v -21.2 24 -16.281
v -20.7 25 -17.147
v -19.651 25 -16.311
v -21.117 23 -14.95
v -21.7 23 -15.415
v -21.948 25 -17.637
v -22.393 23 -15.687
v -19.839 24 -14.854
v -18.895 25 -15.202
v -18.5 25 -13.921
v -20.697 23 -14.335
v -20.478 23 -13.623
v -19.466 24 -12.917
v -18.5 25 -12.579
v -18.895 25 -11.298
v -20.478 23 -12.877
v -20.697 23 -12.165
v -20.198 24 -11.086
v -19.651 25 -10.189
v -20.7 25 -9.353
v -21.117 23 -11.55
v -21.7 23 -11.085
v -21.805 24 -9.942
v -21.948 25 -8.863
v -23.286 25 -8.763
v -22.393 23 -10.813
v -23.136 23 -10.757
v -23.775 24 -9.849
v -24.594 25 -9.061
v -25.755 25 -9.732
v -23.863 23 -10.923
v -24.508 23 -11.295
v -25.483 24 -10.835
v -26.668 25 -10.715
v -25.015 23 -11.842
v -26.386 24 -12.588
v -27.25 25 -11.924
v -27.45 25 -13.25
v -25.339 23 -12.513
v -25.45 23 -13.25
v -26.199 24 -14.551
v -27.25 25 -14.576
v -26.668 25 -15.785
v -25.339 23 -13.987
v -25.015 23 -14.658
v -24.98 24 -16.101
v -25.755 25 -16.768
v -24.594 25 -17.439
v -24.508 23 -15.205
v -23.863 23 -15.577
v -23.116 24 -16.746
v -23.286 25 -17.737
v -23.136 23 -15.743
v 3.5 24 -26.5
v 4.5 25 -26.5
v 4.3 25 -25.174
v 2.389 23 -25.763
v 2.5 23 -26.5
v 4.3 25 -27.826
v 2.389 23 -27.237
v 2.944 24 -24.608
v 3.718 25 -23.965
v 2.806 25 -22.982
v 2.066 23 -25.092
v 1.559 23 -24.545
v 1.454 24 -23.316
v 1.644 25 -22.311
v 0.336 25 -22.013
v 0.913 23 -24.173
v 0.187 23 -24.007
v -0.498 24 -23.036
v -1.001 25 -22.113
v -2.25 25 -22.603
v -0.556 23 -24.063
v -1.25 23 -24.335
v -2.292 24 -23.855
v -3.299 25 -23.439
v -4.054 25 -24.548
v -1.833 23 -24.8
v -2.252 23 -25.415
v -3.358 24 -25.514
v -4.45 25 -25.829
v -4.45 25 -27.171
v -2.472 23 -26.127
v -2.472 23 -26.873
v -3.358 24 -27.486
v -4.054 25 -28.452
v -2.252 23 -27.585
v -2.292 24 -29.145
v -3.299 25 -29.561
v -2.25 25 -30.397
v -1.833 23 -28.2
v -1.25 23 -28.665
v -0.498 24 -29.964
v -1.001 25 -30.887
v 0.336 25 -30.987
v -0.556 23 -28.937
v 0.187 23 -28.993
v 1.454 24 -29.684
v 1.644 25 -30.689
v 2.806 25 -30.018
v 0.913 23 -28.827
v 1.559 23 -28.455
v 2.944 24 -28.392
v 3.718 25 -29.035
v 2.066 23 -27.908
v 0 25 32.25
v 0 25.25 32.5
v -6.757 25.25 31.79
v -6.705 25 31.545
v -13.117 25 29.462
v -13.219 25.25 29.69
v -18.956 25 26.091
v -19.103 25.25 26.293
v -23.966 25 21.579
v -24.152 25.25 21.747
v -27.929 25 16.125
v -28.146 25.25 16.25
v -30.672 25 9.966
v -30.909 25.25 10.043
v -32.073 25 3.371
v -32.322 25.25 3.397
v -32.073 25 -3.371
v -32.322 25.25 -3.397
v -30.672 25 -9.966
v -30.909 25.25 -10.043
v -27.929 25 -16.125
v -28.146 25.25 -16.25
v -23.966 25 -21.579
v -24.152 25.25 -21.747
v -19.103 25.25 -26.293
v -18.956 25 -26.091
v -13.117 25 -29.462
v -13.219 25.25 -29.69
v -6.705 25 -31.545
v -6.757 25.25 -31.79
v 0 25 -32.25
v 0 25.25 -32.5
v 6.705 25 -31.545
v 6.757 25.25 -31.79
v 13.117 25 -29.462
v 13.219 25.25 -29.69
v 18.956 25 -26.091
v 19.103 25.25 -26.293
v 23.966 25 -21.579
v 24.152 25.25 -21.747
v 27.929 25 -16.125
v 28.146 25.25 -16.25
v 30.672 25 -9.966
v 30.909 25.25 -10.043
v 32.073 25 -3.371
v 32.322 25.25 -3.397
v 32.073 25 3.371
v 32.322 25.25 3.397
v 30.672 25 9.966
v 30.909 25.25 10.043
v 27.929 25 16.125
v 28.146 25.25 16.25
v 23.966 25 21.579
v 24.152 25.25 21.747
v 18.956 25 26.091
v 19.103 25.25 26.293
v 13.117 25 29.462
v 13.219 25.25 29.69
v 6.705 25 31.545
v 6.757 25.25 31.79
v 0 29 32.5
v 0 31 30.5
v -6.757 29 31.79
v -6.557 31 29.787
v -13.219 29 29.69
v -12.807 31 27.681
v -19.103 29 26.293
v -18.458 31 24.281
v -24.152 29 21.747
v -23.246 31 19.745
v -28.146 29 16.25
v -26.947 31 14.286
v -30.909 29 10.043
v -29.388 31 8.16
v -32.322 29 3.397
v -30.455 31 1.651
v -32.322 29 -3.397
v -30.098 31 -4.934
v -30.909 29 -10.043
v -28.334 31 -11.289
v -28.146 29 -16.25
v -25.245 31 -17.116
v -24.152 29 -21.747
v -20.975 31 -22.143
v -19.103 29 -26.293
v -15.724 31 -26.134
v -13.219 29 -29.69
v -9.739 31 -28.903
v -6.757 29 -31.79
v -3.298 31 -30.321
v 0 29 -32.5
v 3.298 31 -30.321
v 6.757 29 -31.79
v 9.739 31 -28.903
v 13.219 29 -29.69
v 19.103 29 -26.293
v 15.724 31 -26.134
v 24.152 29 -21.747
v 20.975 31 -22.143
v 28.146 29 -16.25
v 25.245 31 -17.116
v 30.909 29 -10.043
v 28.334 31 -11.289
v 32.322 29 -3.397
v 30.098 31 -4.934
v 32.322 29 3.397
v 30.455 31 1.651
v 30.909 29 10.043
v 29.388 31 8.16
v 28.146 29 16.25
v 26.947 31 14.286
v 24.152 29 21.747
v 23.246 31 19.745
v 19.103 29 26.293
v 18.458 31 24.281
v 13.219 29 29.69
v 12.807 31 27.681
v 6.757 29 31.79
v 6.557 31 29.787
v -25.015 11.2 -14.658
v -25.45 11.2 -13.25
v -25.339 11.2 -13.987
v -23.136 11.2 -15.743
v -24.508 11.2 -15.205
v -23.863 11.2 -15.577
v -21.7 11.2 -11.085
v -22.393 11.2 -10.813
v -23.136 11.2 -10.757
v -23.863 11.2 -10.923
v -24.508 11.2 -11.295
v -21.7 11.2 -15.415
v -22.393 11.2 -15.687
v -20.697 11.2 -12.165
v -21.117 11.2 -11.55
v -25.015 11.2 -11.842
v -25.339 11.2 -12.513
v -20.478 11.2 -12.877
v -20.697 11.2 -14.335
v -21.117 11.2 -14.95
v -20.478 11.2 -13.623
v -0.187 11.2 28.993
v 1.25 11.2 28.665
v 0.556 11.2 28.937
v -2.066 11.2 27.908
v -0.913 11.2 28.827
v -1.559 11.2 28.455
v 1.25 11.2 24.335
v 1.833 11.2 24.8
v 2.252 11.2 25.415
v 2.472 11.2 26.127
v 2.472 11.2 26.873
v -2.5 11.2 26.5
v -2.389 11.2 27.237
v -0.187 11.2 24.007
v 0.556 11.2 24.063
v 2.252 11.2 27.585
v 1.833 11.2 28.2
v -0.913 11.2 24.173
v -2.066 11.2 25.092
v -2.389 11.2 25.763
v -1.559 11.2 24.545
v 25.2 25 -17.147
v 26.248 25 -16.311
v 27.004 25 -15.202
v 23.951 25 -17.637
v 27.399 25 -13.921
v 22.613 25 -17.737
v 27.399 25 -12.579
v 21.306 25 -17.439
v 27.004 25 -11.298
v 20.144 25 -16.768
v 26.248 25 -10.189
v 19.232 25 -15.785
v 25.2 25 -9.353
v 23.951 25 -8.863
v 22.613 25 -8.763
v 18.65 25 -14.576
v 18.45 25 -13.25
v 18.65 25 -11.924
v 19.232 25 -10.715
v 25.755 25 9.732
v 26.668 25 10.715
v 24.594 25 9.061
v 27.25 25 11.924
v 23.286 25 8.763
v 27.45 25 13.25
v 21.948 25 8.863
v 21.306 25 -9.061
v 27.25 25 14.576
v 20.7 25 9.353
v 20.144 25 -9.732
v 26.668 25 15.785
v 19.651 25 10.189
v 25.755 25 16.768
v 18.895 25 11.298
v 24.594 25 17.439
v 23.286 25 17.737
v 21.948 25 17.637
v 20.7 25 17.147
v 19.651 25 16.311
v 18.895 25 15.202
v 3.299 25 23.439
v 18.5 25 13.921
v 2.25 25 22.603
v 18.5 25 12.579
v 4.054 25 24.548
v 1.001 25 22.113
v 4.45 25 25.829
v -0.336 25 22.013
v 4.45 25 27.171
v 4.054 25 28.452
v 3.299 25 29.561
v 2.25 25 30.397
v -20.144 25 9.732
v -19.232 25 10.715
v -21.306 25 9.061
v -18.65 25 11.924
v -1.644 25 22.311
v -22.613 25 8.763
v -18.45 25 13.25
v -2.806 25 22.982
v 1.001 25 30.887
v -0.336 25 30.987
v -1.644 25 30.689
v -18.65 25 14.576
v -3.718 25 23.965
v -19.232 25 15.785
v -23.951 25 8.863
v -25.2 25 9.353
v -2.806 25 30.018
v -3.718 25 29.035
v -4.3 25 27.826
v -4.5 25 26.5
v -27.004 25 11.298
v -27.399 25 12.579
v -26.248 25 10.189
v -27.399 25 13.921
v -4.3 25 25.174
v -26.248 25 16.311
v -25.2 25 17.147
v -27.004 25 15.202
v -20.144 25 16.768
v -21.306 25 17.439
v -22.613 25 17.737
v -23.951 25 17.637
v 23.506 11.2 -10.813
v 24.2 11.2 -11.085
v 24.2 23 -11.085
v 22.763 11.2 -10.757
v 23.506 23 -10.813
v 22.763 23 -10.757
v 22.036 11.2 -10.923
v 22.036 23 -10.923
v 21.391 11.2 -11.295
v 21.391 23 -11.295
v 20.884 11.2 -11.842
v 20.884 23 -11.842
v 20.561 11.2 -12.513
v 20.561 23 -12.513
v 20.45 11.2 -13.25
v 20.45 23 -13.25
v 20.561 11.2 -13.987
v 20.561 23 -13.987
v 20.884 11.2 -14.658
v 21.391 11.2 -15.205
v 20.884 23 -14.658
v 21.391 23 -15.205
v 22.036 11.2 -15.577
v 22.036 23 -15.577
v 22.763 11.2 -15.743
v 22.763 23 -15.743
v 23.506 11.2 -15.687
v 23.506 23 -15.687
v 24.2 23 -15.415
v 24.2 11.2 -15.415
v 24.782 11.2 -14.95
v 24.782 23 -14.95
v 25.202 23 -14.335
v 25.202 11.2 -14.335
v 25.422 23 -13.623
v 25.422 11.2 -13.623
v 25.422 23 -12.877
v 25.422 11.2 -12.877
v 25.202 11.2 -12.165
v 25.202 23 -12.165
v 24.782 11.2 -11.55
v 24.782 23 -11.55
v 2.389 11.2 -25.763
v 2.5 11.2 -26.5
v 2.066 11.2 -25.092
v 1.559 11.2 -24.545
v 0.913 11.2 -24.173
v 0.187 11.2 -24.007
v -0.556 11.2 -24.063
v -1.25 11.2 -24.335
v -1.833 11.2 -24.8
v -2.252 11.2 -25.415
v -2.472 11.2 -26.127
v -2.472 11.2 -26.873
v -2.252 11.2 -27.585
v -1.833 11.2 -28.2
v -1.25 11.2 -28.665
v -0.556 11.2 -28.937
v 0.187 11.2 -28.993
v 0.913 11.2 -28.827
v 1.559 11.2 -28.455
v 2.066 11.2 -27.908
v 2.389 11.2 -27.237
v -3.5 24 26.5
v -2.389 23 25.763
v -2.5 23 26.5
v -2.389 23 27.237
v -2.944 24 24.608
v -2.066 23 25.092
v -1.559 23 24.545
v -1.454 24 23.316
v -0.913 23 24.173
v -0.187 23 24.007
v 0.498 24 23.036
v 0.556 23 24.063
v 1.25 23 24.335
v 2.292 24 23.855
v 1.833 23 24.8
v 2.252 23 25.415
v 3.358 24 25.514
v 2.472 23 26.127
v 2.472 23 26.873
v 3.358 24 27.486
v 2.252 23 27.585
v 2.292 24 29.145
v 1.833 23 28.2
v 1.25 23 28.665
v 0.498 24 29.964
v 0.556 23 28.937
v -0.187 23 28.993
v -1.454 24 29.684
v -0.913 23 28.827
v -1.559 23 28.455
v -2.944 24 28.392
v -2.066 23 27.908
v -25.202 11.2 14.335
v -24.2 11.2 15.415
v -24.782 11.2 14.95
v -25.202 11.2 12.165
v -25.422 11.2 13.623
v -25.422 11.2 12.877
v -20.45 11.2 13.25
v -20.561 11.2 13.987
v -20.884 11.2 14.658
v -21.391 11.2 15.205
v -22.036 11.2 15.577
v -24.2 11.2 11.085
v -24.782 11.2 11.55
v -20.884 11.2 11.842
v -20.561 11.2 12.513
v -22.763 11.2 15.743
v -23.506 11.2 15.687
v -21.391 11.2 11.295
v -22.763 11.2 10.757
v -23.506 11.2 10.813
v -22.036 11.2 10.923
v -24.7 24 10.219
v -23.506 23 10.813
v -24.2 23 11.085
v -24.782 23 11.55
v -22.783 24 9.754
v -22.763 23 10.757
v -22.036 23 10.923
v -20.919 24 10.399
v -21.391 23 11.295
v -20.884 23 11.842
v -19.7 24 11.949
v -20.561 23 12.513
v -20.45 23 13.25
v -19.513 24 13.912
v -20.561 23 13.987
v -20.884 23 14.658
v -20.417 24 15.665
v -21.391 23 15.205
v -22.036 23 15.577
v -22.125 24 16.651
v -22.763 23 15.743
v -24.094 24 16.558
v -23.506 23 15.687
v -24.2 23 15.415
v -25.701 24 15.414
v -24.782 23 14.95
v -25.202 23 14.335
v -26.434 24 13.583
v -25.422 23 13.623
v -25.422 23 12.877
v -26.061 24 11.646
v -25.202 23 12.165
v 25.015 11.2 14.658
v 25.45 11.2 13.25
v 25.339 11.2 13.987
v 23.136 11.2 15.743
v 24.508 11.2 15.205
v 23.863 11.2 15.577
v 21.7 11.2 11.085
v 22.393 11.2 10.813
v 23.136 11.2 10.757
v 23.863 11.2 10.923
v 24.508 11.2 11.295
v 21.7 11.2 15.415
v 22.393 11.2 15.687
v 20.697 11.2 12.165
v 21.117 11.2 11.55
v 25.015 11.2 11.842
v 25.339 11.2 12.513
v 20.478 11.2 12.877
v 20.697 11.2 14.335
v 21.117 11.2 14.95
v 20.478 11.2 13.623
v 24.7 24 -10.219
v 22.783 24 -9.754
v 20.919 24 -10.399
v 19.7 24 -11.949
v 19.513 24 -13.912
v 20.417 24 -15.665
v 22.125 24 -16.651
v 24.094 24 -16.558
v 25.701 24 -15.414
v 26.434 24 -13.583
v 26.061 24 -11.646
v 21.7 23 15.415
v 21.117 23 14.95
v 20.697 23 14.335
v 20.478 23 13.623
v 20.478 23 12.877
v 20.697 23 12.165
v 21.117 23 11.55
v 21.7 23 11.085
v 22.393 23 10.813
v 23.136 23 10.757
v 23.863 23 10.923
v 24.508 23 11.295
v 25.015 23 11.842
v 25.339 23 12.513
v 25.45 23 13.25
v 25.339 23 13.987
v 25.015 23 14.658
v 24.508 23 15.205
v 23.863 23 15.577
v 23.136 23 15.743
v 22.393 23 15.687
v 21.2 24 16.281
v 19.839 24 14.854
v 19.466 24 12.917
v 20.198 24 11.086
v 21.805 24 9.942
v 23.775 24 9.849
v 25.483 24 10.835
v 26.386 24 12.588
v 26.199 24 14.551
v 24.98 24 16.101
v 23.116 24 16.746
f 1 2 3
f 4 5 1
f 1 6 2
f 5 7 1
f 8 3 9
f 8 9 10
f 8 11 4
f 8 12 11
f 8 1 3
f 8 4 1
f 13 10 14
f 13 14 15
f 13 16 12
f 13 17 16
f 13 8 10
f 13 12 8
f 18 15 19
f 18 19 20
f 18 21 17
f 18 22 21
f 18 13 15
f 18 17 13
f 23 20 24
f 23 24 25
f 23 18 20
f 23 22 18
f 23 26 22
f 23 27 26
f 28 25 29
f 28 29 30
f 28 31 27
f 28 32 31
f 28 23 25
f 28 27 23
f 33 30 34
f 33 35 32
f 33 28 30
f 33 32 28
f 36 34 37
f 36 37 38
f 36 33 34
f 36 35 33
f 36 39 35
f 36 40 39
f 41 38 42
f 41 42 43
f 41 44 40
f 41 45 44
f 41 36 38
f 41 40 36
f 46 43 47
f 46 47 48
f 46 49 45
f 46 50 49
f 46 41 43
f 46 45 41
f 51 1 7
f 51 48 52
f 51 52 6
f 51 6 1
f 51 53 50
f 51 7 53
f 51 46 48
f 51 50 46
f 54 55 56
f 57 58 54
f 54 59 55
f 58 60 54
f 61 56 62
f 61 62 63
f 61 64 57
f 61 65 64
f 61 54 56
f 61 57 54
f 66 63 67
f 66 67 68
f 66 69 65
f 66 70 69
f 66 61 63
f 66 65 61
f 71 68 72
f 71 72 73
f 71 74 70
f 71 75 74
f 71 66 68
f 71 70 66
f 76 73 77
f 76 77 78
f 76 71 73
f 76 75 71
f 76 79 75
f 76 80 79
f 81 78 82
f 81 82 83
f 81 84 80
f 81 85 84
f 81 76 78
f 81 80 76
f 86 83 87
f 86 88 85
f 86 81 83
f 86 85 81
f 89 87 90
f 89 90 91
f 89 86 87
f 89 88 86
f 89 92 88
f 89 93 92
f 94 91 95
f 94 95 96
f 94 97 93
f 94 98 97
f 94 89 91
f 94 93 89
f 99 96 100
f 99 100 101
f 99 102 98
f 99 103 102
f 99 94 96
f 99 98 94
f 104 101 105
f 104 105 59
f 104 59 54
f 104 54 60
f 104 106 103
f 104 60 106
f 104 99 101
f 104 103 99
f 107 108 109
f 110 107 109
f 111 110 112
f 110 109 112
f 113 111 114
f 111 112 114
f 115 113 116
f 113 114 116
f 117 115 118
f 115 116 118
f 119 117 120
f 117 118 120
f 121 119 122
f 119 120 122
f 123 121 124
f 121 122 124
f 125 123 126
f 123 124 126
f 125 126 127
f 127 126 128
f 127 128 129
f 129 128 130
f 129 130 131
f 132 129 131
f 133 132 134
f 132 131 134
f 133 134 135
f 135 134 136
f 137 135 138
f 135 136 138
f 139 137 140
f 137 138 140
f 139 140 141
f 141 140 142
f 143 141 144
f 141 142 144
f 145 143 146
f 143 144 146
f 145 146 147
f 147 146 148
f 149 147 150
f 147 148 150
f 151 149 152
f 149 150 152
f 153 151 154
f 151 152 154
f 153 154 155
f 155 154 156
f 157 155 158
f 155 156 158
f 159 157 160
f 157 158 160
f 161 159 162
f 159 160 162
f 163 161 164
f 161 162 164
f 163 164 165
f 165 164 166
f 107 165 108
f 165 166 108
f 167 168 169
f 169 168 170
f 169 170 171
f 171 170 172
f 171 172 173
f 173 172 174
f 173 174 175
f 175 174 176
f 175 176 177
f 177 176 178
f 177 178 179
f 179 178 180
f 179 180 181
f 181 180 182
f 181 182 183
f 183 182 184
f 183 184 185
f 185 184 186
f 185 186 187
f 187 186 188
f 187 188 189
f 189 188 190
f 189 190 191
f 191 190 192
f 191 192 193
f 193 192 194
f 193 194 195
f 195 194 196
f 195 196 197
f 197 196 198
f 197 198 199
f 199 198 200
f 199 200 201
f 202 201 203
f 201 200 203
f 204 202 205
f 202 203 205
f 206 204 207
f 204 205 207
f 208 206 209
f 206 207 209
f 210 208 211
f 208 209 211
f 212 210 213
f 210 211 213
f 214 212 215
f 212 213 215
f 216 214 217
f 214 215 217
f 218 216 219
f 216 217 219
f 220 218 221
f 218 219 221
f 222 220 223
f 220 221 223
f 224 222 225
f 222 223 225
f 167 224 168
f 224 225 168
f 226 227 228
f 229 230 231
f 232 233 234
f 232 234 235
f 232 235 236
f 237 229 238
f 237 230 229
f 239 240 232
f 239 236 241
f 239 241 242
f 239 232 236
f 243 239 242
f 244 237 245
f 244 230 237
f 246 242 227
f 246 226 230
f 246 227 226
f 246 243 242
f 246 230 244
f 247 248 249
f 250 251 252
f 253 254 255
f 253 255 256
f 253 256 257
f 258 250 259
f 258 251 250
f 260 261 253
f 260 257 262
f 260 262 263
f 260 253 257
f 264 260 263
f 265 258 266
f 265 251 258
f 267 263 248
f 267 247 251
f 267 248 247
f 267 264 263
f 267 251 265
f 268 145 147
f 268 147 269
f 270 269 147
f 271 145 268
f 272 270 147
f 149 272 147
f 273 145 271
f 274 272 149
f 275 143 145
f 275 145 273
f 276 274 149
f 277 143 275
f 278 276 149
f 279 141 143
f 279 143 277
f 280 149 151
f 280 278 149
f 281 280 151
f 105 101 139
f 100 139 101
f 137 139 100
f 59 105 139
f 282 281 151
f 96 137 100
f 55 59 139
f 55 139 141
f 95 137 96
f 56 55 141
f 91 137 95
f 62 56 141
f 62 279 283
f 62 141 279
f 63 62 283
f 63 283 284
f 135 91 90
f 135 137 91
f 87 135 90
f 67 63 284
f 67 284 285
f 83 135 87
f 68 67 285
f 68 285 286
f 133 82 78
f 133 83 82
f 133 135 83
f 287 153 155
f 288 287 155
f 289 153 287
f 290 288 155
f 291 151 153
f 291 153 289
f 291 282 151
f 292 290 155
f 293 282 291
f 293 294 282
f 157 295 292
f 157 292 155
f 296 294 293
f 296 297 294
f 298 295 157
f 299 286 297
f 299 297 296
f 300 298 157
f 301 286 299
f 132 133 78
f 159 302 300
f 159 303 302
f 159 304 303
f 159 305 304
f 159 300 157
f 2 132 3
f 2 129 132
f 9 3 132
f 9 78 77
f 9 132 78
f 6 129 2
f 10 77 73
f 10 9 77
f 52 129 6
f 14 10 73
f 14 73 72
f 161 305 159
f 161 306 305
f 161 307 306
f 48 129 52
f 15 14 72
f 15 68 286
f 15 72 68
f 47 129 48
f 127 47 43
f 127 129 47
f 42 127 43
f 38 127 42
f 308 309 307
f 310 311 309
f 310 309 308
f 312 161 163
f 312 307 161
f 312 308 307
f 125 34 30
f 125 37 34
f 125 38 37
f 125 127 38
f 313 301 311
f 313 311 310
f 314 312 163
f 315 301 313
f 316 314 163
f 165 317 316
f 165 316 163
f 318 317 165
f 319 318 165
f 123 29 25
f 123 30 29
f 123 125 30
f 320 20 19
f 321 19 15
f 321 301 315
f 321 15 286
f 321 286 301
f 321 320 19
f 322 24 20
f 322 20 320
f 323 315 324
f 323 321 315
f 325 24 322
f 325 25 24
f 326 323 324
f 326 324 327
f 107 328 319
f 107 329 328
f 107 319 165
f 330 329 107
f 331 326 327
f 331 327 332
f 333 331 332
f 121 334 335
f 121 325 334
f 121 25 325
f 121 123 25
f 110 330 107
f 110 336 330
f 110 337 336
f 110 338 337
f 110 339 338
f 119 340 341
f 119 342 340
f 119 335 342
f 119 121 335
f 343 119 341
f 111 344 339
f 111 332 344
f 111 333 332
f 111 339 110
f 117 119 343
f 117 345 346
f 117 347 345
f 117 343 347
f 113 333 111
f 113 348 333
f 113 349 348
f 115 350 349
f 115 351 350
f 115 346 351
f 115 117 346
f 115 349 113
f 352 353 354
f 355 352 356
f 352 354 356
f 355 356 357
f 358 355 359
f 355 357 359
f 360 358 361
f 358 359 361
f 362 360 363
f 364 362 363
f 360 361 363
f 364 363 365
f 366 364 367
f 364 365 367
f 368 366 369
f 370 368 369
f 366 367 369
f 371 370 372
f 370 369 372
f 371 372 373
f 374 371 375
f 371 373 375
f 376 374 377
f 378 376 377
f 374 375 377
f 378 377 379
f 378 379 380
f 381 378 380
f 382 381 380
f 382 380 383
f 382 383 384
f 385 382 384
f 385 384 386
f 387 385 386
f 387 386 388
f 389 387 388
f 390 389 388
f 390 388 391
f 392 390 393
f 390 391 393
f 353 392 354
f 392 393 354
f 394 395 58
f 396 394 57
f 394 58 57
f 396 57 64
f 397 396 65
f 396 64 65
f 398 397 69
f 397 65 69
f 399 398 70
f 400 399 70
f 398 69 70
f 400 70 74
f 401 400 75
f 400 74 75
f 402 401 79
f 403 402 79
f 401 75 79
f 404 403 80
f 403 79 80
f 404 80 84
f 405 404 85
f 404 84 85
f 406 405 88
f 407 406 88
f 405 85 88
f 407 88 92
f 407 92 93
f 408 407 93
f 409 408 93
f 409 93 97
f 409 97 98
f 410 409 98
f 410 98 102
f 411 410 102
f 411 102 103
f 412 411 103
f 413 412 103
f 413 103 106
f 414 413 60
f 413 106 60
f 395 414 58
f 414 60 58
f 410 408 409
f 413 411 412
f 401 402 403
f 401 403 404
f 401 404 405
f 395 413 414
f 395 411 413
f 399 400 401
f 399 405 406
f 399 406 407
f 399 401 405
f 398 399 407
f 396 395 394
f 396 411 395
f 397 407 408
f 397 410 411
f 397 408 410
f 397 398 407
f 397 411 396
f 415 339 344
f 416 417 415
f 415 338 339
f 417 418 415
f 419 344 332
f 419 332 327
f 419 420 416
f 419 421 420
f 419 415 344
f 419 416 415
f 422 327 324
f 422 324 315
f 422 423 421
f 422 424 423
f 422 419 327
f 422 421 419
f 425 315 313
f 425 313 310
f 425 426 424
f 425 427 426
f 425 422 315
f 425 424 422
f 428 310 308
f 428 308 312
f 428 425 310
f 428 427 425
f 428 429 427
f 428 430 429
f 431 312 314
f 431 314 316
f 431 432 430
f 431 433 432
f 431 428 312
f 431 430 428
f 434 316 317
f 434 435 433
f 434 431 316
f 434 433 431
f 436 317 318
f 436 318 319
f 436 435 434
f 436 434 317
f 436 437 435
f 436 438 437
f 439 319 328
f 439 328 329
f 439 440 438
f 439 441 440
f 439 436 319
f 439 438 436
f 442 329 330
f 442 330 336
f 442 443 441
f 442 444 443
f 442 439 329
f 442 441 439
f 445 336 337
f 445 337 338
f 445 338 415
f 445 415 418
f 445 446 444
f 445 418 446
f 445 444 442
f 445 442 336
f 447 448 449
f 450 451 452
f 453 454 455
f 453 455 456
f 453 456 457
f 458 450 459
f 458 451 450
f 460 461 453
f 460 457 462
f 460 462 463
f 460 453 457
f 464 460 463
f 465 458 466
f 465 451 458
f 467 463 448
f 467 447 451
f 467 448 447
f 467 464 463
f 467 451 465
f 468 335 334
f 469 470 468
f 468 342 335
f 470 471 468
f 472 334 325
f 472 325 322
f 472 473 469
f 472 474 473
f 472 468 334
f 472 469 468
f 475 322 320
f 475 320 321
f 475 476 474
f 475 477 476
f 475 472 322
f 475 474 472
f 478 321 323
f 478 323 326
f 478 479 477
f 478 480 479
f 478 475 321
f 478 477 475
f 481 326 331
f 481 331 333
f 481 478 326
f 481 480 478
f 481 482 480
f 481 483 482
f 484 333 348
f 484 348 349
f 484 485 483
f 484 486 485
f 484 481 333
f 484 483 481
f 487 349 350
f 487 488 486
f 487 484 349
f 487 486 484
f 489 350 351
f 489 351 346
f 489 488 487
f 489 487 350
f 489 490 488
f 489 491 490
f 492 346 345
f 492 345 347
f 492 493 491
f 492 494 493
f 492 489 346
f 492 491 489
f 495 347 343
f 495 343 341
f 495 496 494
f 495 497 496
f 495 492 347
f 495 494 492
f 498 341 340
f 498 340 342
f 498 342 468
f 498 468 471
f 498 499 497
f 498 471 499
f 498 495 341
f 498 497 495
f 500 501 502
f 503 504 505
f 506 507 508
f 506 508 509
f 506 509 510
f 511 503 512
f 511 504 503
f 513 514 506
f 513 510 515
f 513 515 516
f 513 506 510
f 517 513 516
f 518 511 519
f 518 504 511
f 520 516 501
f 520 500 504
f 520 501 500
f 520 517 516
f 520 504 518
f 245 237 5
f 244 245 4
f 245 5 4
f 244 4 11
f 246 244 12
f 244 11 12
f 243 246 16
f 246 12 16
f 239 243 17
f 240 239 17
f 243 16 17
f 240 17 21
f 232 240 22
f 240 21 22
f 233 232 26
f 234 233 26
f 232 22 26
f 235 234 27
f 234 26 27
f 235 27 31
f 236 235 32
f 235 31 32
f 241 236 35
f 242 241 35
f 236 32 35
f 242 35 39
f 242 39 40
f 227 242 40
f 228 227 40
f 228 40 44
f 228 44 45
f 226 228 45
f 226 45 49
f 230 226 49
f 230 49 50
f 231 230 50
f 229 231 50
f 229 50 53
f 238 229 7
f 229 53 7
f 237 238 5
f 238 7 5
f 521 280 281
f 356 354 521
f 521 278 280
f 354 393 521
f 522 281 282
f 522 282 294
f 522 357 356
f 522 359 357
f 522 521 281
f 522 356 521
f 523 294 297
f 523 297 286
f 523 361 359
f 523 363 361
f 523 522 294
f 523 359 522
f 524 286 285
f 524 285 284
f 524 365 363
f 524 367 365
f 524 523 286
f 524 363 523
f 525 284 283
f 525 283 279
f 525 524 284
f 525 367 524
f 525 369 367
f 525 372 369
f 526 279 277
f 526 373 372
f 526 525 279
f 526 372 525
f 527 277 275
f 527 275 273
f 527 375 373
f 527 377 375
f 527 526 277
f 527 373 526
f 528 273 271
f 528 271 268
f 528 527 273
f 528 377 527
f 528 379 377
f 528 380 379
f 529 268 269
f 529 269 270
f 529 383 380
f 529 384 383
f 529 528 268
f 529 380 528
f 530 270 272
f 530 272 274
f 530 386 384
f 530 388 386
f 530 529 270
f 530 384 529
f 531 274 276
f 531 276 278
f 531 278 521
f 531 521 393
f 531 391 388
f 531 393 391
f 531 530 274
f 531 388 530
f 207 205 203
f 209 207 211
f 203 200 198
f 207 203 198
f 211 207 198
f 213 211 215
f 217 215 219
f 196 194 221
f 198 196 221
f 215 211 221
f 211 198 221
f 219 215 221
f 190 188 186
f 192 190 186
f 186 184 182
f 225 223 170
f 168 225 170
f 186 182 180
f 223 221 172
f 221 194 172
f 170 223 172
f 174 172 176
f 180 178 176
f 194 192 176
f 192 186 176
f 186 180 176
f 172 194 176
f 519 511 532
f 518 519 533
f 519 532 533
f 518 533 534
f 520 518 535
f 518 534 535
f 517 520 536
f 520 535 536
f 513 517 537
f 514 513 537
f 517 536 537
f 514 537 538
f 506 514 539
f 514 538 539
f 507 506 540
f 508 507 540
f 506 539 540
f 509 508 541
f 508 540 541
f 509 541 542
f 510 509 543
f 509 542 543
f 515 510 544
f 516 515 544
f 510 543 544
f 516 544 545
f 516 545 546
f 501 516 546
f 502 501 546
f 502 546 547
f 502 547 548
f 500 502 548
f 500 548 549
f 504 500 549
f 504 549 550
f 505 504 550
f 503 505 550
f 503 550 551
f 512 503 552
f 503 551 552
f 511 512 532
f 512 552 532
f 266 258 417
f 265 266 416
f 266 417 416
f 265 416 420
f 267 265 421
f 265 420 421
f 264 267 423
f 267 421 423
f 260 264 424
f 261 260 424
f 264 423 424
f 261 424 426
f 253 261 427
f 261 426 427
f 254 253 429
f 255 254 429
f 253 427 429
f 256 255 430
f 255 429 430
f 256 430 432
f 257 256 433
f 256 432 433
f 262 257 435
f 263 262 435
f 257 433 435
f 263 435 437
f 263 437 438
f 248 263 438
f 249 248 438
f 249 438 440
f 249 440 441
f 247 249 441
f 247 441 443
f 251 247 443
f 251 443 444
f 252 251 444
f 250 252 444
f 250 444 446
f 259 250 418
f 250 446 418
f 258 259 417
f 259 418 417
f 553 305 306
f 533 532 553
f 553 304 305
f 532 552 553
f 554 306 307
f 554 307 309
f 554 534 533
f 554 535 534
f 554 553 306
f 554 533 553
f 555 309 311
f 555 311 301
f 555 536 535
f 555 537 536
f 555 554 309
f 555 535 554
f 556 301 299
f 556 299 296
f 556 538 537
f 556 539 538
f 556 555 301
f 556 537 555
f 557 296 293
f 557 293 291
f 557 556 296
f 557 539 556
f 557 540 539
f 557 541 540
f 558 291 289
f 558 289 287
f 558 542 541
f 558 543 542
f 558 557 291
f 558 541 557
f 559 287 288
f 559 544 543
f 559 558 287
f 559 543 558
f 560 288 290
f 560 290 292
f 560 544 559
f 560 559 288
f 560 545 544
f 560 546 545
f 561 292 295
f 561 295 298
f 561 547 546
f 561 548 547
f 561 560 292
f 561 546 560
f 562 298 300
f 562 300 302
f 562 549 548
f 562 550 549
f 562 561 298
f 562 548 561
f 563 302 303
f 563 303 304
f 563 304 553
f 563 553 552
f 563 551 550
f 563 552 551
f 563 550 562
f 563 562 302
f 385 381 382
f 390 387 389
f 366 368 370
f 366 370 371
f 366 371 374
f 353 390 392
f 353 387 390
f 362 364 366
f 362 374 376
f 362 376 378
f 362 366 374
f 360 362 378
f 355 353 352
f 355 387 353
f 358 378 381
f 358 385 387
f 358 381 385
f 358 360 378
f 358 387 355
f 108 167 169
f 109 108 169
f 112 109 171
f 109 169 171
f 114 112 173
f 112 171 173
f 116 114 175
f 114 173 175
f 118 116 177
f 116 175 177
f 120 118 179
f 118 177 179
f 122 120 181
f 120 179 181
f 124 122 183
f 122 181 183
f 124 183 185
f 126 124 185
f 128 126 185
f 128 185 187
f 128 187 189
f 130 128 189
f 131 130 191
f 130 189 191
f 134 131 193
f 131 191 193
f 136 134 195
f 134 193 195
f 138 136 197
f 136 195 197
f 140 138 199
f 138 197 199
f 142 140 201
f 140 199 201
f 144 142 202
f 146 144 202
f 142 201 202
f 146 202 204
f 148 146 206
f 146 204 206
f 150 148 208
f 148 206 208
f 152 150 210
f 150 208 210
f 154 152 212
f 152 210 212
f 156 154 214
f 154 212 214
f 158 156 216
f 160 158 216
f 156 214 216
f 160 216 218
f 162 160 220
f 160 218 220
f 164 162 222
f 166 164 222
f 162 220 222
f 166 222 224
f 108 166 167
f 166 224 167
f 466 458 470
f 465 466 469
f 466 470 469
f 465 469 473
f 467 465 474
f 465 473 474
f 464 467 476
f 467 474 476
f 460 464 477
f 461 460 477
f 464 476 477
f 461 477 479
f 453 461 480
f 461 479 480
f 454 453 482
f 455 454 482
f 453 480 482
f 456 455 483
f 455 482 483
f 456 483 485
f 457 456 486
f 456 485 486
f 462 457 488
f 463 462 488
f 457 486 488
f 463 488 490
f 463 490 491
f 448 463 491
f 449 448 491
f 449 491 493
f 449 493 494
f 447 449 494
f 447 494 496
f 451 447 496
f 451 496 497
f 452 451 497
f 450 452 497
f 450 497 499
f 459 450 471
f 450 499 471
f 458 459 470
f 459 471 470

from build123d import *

# Parameters (mm, degrees)
SKETCH3_W           = 32.5
SKETCH3_H           = 6
CHAMFER2_SIZE       = 2
SKETCH4_R           = 2.5
BOSS_EXTRUDE1_DEPTH = 13.8
CIRPATTERN1_COUNT   = 6
CHAMFER3_SIZE       = 2
CHAMFER4_SIZE       = 0.25


with BuildPart() as part:
    # Sketch3 → Revolve1 (revolve)
    with BuildSketch(Plane(origin=(0, 0, 0), x_dir=(0, 0, -1), z_dir=(1, 0, 0))):
        with Locations((-16.25, 28)):
            Rectangle(SKETCH3_W, SKETCH3_H)
    revolve(axis=Axis((0, 0, 0), (0, -1, 0)))

    # Chamfer2
    chamfer2_edges = [part.edges().sort_by_distance(p)[0] for p in [
        (0, 31, -32.5),
    ]]
    chamfer(chamfer2_edges, length=CHAMFER2_SIZE)

    # Sketch4 → Boss-Extrude1 (add)
    with BuildSketch(Plane.XZ.offset(-25)):
        with Locations(Location((0, 26.5, 0), (0, 0, 180))):
            Circle(SKETCH4_R)
    boss_extrude1 = extrude(amount=BOSS_EXTRUDE1_DEPTH)

    # CirPattern1: Boss-Extrude1 ×6 about axis
    cirpattern1_axis = Axis((0, 0, 0), (0, 1, 0))
    for i in range(1, CIRPATTERN1_COUNT):
        add(boss_extrude1.rotate(cirpattern1_axis, i * 360 / CIRPATTERN1_COUNT))

    # Chamfer3
    chamfer3_edges = [part.edges().sort_by_distance(p)[0] for p in [
        (2.5, 25, 26.5),
        (24.1996732, 25, 11.084936491),
        (21.6996732, 25, -15.415063509),
        (-2.5, 25, -26.5),
        (-24.1996732, 25, -11.084936491),
        (-21.6996732, 25, 15.415063509),
    ]]
    chamfer(chamfer3_edges, length=CHAMFER3_SIZE)

    # Chamfer4
    chamfer4_edges = [part.edges().sort_by_distance(p)[0] for p in [
        (0, 25, -32.5),
    ]]
    chamfer(chamfer4_edges, length=CHAMFER4_SIZE)


solid = part.part
